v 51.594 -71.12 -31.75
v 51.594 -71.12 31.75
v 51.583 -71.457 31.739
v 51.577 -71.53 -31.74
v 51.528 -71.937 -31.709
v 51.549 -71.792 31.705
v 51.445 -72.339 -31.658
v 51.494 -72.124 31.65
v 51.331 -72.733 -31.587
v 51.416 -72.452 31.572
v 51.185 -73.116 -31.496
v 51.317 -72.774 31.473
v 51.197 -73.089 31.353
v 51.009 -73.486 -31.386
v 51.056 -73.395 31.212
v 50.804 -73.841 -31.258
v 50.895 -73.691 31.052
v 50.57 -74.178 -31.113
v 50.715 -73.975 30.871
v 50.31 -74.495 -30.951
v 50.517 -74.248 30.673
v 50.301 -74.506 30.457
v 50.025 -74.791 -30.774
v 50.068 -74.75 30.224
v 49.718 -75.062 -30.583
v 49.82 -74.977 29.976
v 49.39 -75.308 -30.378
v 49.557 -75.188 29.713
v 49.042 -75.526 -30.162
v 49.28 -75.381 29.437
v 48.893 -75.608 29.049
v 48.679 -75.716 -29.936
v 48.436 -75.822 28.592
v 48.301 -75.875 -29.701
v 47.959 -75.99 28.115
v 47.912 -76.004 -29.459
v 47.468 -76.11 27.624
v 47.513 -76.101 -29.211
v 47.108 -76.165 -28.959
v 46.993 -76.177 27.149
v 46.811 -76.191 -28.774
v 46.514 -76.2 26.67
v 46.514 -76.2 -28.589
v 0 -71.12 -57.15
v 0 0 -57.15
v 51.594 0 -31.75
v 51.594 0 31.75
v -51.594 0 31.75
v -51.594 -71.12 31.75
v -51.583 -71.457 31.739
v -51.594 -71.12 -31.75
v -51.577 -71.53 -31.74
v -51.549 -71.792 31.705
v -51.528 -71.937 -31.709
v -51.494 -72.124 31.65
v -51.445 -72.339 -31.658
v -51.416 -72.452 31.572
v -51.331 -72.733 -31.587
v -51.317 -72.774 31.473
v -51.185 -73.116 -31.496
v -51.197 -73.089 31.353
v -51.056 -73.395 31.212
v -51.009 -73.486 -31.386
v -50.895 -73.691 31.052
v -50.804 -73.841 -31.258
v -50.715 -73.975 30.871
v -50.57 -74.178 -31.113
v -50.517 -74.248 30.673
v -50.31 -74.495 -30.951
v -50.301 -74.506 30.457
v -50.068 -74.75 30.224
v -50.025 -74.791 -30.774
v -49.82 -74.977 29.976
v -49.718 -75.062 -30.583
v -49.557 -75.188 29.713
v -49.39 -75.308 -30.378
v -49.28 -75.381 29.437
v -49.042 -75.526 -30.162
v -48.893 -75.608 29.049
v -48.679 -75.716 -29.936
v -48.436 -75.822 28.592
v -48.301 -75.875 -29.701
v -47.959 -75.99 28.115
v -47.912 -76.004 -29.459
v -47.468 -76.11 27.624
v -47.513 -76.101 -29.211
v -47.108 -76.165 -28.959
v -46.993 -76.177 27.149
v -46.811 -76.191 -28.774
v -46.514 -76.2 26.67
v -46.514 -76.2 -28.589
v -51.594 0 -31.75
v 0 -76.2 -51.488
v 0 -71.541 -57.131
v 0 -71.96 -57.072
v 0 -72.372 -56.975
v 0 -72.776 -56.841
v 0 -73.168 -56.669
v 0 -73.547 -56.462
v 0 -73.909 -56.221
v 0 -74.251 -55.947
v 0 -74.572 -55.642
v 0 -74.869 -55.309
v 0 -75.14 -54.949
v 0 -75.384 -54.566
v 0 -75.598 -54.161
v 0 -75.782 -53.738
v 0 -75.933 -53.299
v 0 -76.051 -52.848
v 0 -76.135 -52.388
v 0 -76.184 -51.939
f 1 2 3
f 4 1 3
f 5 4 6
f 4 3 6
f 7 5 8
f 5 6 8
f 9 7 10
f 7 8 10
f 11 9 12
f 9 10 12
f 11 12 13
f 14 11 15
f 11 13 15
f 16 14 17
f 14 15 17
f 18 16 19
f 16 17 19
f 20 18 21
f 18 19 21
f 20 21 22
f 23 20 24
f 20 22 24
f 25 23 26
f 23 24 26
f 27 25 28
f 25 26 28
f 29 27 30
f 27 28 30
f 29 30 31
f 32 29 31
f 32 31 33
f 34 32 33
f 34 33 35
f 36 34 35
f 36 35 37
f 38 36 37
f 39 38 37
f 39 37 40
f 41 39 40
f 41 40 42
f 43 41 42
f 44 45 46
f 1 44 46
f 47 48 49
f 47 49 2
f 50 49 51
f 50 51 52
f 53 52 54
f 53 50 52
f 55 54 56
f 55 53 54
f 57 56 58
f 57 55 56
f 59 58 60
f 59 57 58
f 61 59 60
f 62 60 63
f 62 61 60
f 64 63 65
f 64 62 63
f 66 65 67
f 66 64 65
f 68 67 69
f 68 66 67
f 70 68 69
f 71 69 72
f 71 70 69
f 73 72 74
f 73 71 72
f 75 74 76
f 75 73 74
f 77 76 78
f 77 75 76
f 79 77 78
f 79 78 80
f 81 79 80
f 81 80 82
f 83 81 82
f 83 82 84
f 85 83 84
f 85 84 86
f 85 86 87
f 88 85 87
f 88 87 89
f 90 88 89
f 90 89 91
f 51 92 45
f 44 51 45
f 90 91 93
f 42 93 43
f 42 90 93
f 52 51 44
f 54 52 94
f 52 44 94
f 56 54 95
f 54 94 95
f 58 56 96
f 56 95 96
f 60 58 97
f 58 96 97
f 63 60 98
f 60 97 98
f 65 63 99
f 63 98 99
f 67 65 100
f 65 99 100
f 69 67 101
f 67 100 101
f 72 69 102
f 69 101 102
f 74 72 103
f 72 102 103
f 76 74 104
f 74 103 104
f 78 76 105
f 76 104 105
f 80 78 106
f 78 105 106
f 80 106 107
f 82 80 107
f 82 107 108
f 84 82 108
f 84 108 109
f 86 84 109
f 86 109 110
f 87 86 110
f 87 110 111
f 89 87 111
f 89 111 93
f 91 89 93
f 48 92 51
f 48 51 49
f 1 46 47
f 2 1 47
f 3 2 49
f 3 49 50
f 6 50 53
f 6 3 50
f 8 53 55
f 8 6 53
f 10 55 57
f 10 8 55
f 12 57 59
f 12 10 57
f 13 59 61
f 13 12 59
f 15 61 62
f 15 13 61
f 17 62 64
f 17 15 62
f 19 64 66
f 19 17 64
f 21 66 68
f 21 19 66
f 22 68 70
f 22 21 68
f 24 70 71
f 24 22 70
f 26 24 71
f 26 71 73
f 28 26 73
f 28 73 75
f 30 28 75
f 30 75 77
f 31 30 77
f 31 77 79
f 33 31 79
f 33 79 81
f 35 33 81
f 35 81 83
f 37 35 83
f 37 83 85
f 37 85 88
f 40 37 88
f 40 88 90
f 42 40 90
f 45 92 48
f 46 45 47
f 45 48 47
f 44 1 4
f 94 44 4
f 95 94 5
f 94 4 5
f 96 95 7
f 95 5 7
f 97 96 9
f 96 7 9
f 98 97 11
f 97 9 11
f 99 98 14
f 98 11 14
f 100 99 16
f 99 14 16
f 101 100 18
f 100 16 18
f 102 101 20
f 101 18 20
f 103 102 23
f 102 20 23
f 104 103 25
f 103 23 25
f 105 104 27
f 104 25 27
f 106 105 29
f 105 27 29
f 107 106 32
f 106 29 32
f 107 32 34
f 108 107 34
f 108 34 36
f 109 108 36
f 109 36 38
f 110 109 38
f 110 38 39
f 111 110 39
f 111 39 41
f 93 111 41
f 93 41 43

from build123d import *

# Parameters (mm, degrees)
F0_W     = 103.187494
F0_H     = 63.5
F1_DEPTH = 76.2
F2_R     = 5.08


with BuildPart() as f1:
    # F0 (on Front) → F1 (new body)
    with BuildSketch(Plane.XZ):
        Rectangle(F0_W, F0_H)
        Polygon((51.593747, -31.75), (-51.593747, -31.75), (0, -57.150003), align=None)
    extrude(amount=F1_DEPTH)

    # F2
    f2_edges = [f1.edges().sort_by_distance(p)[0] for p in [
        (0, -76.2, 31.75),
        (-51.593747, -76.2, 0),
        (-25.796873, -76.2, -44.450001),
        (25.796873, -76.2, -44.450001),
        (51.593747, -76.2, 0),
    ]]
    fillet(f2_edges, radius=F2_R)


solid = f1.part
